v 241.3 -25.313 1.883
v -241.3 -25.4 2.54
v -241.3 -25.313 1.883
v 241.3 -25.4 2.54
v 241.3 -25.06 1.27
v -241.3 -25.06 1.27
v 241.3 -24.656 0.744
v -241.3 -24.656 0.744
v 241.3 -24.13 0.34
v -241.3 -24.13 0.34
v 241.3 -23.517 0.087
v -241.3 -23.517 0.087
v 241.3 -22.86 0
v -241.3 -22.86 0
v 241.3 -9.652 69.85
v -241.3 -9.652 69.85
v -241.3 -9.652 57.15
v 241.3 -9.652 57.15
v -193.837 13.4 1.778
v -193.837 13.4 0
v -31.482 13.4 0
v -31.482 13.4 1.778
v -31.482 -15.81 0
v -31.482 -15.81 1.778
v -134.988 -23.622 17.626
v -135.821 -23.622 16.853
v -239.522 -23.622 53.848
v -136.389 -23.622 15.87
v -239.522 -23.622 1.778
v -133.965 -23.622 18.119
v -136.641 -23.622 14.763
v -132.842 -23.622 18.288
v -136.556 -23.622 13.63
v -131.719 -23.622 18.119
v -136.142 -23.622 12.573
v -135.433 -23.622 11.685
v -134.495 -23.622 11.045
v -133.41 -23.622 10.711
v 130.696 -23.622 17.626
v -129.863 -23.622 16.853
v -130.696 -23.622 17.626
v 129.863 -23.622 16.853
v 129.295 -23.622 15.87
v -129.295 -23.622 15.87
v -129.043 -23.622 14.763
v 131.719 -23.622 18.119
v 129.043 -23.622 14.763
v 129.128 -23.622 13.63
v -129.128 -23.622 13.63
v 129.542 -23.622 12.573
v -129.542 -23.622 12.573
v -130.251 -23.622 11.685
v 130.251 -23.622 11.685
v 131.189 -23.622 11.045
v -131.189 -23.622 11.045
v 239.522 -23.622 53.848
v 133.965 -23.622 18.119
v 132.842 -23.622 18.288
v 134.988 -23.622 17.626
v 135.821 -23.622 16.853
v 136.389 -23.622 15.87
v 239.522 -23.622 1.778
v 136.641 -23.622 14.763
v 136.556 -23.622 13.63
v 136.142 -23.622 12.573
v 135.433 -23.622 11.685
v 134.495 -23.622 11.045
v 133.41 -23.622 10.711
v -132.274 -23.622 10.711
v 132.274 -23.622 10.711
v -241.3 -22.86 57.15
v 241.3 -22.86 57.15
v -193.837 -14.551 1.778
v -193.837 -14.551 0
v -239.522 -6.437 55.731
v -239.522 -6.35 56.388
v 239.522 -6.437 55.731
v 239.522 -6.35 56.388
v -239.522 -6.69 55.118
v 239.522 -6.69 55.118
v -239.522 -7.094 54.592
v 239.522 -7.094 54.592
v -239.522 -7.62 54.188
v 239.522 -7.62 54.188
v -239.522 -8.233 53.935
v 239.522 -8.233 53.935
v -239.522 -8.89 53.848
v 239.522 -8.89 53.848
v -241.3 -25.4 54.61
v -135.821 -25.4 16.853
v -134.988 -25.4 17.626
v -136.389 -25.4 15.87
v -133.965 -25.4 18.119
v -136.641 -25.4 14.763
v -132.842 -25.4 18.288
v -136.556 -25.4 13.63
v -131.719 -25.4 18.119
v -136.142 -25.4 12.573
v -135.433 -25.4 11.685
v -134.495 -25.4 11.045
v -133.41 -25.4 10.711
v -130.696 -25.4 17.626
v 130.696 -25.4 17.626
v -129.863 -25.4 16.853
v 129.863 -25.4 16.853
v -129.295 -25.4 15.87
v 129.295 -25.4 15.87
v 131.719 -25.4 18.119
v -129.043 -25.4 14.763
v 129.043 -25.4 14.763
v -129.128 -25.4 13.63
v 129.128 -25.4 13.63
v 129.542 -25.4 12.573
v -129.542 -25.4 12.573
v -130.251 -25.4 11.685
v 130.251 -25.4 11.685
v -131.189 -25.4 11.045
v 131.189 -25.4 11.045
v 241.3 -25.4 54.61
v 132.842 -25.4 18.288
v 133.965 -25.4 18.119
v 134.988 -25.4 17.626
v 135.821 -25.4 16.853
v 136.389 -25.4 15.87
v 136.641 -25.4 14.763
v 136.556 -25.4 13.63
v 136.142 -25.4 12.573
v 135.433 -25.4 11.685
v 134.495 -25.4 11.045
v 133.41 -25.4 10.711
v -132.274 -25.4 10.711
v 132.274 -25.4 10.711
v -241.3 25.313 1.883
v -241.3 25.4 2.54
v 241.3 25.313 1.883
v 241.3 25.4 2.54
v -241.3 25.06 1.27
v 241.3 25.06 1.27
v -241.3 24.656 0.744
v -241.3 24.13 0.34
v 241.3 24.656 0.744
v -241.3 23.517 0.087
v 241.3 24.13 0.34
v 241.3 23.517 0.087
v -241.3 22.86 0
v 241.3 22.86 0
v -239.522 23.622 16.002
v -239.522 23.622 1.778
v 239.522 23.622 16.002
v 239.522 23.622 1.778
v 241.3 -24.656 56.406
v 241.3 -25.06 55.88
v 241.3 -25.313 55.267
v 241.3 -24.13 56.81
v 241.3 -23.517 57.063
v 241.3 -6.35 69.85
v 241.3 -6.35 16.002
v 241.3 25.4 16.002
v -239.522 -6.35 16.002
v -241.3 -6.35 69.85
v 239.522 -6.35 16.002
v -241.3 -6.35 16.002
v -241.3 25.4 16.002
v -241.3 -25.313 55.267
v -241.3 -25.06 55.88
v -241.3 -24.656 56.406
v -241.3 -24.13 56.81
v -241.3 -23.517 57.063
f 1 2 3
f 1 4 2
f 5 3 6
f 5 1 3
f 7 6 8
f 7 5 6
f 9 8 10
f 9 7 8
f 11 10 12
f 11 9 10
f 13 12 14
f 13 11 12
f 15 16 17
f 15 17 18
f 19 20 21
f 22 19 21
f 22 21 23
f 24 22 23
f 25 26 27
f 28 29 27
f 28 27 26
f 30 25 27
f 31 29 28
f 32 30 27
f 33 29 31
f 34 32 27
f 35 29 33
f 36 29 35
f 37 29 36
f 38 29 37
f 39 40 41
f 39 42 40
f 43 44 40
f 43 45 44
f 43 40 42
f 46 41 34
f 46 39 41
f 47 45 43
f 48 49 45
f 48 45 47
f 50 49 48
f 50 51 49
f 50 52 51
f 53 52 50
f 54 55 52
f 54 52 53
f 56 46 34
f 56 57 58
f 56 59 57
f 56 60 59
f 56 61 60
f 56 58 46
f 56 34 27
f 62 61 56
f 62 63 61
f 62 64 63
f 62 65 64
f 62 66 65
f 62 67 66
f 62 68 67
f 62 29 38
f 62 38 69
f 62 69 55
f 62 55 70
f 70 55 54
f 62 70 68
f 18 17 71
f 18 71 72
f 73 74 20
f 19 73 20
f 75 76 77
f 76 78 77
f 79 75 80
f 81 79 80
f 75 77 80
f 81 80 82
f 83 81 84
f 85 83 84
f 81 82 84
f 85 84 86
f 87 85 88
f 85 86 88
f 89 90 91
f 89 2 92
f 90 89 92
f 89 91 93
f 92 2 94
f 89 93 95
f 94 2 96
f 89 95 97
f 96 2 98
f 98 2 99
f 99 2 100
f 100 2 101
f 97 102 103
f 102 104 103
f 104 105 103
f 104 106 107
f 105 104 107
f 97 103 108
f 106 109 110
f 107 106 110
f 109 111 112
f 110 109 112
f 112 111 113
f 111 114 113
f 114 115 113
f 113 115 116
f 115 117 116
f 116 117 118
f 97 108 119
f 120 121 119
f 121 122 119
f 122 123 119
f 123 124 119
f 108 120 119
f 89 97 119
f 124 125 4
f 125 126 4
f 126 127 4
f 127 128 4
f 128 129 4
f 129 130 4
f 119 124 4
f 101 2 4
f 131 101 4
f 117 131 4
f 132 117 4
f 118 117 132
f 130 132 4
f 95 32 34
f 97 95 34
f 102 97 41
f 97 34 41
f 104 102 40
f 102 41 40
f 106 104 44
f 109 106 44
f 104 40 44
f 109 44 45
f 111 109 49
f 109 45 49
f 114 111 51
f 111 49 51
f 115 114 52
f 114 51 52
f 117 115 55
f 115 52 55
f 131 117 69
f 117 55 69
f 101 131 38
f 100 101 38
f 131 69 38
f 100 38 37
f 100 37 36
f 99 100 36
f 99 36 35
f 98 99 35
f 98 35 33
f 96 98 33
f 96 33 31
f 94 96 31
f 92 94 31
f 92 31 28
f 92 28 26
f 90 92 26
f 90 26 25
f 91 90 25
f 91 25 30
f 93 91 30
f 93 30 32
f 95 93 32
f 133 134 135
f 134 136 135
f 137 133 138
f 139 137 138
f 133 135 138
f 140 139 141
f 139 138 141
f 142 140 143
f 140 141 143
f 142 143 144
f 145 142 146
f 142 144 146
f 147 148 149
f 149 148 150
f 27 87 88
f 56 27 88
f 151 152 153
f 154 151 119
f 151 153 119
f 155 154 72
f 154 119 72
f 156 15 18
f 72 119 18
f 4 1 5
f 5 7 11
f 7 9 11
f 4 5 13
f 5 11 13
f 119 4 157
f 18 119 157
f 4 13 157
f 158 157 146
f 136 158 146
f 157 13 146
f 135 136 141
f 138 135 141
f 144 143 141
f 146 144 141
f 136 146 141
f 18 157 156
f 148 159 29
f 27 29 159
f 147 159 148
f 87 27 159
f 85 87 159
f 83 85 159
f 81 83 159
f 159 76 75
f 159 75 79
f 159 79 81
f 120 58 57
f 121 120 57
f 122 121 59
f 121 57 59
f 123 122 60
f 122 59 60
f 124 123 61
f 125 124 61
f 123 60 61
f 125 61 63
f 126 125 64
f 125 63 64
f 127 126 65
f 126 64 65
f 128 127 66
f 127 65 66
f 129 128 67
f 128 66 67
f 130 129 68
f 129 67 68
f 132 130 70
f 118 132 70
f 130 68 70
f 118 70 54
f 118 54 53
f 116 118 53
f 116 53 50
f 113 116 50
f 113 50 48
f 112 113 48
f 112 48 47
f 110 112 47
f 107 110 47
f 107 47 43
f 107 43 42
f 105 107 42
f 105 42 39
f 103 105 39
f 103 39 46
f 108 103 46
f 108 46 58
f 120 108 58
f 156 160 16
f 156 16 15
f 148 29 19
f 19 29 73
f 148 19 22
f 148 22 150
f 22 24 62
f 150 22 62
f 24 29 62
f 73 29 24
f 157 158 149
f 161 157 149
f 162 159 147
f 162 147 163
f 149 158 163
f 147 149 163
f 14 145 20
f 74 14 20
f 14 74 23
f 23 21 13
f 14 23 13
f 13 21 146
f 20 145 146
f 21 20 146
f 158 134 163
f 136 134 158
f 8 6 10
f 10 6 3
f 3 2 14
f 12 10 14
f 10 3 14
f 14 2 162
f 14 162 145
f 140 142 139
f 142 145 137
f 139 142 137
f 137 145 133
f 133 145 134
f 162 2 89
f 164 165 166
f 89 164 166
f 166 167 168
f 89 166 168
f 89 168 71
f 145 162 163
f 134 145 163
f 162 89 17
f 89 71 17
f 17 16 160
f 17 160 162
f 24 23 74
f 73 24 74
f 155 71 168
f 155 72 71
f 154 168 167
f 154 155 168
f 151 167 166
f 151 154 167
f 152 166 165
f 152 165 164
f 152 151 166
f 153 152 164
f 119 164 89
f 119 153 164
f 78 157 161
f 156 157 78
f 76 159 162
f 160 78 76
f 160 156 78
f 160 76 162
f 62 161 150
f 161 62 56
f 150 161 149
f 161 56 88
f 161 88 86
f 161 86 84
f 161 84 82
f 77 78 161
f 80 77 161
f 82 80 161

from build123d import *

# Parameters (mm, degrees)
SKETCH1_W           = 482.6
SKETCH1_H           = 50.8
BOSS_EXTRUDE1_DEPTH = 69.85
CUT_EXTRUDE2_DEPTH  = 49.022
SKETCH3_W           = 482.6
SKETCH3_H           = 16.002
CUT_EXTRUDE3_DEPTH  = 31.75
SKETCH4_W           = 482.6
SKETCH4_H           = 15.748
CUT_EXTRUDE4_DEPTH  = 12.7
SHELL2_START        = -23.622
SHELL2_OUTLINE_W    = 479.044
SHELL2_OUTLINE_H    = 14.224
SHELL2_DEPTH        = 47.244
SKETCH5_W           = 1.778
SKETCH5_H           = 17.272
BOSS_EXTRUDE2_DEPTH = 44.45
FILLET1_R           = 2.54
SKETCH6_R           = 3.81
CUT_EXTRUDE5_DEPTH  = 44.45
CUT_EXTRUDE6_REACH  = 254.487


# Read off the part's stored shape, not the designer's step: Shell2
with BuildPart() as part:
    # Sketch1 → Boss-Extrude1 (new body)
    with BuildSketch(Plane.XY):
        Rectangle(SKETCH1_W, SKETCH1_H)
    extrude(amount=BOSS_EXTRUDE1_DEPTH)

    # Sketch2 → Cut-Extrude2 (cut)
    with BuildSketch(Plane(origin=(0, 25.4, 0), x_dir=(1, 0, 0), z_dir=(0, 1, 0))):
        Polygon((241.3, -16.002), (-241.3, -16.002), (-241.3, -34.925), (-241.3, -53.848), (241.3, -53.848), align=None)
    extrude(amount=-CUT_EXTRUDE2_DEPTH, mode=Mode.SUBTRACT)

    # Sketch3 → Cut-Extrude3 (cut)
    with BuildSketch(Plane(origin=(0, 25.4, 0), x_dir=(1, 0, 0), z_dir=(0, 1, 0))):
        with Locations((0, -61.849)):
            Rectangle(SKETCH3_W, SKETCH3_H)
    extrude(amount=-CUT_EXTRUDE3_DEPTH, mode=Mode.SUBTRACT)

    # Sketch4 → Cut-Extrude4 (cut)
    with BuildSketch(Plane.XY.offset(69.85)):
        with Locations((0, -17.526)):
            Rectangle(SKETCH4_W, SKETCH4_H)
    extrude(amount=-CUT_EXTRUDE4_DEPTH, mode=Mode.SUBTRACT)

    # Shell2 outline → Shell2 (cut)
    with BuildSketch(Plane(origin=(0, 0, 0), x_dir=(1, 0, 0), z_dir=(0, 1, 0)).offset(SHELL2_START)):
        with Locations((0, -8.89)):
            Rectangle(SHELL2_OUTLINE_W, SHELL2_OUTLINE_H)
    extrude(amount=SHELL2_DEPTH, mode=Mode.SUBTRACT)

    # Sketch5 → Boss-Extrude2 (add)
    with BuildSketch(Plane(origin=(0, 0, 53.848), x_dir=(-1, 0, 0), z_dir=(0, 0, -1))):
        with Locations((240.411, -14.986)):
            Rectangle(SKETCH5_W, SKETCH5_H)
        with Locations((-240.411, -14.986)):
            Rectangle(SKETCH5_W, SKETCH5_H)
    extrude(amount=BOSS_EXTRUDE2_DEPTH)

    # Fillet1
    fillet1_edges = [part.edges().sort_by_distance(p)[0] for p in [
        (0, -25.4, 0),
        (0, -25.4, 57.15),
        (0, 25.4, 0),
        (0, -6.35, 53.848),
    ]]
    fillet(fillet1_edges, radius=FILLET1_R)

    # Sketch6 → Cut-Extrude5 (cut)
    with BuildSketch(Plane(origin=(0, -23.622, 0), x_dir=(1, 0, 0), z_dir=(0, 1, 0))):
        with Locations(Location((-132.842, -14.478, 0), (0, 0, 270))):
            Circle(SKETCH6_R)
        with Locations(Location((132.842, -14.478, 0), (0, 0, 270))):
            Circle(SKETCH6_R)
    extrude(amount=-CUT_EXTRUDE5_DEPTH, mode=Mode.SUBTRACT)

    # Sketch8 → Cut-Extrude6 (cut, up to next)
    with BuildSketch(Plane(origin=(0, 0, 0), x_dir=(-1, 0, 0), z_dir=(0, 0, -1)), mode=Mode.PRIVATE) as cut_extrude6_sk1:
        Polygon((31.482, 13.4), (31.482, -15.81), (193.836883288, -14.551149116), (193.836883288, 13.4), align=None)
    cut_extrude6_tool1 = extrude(cut_extrude6_sk1.sketch, amount=-CUT_EXTRUDE6_REACH, mode=Mode.PRIVATE) & part.part
    add(cut_extrude6_tool1.solids().sort_by_distance((-112.063522, -0.892598, 0))[0], mode=Mode.SUBTRACT)


solid = part.part
